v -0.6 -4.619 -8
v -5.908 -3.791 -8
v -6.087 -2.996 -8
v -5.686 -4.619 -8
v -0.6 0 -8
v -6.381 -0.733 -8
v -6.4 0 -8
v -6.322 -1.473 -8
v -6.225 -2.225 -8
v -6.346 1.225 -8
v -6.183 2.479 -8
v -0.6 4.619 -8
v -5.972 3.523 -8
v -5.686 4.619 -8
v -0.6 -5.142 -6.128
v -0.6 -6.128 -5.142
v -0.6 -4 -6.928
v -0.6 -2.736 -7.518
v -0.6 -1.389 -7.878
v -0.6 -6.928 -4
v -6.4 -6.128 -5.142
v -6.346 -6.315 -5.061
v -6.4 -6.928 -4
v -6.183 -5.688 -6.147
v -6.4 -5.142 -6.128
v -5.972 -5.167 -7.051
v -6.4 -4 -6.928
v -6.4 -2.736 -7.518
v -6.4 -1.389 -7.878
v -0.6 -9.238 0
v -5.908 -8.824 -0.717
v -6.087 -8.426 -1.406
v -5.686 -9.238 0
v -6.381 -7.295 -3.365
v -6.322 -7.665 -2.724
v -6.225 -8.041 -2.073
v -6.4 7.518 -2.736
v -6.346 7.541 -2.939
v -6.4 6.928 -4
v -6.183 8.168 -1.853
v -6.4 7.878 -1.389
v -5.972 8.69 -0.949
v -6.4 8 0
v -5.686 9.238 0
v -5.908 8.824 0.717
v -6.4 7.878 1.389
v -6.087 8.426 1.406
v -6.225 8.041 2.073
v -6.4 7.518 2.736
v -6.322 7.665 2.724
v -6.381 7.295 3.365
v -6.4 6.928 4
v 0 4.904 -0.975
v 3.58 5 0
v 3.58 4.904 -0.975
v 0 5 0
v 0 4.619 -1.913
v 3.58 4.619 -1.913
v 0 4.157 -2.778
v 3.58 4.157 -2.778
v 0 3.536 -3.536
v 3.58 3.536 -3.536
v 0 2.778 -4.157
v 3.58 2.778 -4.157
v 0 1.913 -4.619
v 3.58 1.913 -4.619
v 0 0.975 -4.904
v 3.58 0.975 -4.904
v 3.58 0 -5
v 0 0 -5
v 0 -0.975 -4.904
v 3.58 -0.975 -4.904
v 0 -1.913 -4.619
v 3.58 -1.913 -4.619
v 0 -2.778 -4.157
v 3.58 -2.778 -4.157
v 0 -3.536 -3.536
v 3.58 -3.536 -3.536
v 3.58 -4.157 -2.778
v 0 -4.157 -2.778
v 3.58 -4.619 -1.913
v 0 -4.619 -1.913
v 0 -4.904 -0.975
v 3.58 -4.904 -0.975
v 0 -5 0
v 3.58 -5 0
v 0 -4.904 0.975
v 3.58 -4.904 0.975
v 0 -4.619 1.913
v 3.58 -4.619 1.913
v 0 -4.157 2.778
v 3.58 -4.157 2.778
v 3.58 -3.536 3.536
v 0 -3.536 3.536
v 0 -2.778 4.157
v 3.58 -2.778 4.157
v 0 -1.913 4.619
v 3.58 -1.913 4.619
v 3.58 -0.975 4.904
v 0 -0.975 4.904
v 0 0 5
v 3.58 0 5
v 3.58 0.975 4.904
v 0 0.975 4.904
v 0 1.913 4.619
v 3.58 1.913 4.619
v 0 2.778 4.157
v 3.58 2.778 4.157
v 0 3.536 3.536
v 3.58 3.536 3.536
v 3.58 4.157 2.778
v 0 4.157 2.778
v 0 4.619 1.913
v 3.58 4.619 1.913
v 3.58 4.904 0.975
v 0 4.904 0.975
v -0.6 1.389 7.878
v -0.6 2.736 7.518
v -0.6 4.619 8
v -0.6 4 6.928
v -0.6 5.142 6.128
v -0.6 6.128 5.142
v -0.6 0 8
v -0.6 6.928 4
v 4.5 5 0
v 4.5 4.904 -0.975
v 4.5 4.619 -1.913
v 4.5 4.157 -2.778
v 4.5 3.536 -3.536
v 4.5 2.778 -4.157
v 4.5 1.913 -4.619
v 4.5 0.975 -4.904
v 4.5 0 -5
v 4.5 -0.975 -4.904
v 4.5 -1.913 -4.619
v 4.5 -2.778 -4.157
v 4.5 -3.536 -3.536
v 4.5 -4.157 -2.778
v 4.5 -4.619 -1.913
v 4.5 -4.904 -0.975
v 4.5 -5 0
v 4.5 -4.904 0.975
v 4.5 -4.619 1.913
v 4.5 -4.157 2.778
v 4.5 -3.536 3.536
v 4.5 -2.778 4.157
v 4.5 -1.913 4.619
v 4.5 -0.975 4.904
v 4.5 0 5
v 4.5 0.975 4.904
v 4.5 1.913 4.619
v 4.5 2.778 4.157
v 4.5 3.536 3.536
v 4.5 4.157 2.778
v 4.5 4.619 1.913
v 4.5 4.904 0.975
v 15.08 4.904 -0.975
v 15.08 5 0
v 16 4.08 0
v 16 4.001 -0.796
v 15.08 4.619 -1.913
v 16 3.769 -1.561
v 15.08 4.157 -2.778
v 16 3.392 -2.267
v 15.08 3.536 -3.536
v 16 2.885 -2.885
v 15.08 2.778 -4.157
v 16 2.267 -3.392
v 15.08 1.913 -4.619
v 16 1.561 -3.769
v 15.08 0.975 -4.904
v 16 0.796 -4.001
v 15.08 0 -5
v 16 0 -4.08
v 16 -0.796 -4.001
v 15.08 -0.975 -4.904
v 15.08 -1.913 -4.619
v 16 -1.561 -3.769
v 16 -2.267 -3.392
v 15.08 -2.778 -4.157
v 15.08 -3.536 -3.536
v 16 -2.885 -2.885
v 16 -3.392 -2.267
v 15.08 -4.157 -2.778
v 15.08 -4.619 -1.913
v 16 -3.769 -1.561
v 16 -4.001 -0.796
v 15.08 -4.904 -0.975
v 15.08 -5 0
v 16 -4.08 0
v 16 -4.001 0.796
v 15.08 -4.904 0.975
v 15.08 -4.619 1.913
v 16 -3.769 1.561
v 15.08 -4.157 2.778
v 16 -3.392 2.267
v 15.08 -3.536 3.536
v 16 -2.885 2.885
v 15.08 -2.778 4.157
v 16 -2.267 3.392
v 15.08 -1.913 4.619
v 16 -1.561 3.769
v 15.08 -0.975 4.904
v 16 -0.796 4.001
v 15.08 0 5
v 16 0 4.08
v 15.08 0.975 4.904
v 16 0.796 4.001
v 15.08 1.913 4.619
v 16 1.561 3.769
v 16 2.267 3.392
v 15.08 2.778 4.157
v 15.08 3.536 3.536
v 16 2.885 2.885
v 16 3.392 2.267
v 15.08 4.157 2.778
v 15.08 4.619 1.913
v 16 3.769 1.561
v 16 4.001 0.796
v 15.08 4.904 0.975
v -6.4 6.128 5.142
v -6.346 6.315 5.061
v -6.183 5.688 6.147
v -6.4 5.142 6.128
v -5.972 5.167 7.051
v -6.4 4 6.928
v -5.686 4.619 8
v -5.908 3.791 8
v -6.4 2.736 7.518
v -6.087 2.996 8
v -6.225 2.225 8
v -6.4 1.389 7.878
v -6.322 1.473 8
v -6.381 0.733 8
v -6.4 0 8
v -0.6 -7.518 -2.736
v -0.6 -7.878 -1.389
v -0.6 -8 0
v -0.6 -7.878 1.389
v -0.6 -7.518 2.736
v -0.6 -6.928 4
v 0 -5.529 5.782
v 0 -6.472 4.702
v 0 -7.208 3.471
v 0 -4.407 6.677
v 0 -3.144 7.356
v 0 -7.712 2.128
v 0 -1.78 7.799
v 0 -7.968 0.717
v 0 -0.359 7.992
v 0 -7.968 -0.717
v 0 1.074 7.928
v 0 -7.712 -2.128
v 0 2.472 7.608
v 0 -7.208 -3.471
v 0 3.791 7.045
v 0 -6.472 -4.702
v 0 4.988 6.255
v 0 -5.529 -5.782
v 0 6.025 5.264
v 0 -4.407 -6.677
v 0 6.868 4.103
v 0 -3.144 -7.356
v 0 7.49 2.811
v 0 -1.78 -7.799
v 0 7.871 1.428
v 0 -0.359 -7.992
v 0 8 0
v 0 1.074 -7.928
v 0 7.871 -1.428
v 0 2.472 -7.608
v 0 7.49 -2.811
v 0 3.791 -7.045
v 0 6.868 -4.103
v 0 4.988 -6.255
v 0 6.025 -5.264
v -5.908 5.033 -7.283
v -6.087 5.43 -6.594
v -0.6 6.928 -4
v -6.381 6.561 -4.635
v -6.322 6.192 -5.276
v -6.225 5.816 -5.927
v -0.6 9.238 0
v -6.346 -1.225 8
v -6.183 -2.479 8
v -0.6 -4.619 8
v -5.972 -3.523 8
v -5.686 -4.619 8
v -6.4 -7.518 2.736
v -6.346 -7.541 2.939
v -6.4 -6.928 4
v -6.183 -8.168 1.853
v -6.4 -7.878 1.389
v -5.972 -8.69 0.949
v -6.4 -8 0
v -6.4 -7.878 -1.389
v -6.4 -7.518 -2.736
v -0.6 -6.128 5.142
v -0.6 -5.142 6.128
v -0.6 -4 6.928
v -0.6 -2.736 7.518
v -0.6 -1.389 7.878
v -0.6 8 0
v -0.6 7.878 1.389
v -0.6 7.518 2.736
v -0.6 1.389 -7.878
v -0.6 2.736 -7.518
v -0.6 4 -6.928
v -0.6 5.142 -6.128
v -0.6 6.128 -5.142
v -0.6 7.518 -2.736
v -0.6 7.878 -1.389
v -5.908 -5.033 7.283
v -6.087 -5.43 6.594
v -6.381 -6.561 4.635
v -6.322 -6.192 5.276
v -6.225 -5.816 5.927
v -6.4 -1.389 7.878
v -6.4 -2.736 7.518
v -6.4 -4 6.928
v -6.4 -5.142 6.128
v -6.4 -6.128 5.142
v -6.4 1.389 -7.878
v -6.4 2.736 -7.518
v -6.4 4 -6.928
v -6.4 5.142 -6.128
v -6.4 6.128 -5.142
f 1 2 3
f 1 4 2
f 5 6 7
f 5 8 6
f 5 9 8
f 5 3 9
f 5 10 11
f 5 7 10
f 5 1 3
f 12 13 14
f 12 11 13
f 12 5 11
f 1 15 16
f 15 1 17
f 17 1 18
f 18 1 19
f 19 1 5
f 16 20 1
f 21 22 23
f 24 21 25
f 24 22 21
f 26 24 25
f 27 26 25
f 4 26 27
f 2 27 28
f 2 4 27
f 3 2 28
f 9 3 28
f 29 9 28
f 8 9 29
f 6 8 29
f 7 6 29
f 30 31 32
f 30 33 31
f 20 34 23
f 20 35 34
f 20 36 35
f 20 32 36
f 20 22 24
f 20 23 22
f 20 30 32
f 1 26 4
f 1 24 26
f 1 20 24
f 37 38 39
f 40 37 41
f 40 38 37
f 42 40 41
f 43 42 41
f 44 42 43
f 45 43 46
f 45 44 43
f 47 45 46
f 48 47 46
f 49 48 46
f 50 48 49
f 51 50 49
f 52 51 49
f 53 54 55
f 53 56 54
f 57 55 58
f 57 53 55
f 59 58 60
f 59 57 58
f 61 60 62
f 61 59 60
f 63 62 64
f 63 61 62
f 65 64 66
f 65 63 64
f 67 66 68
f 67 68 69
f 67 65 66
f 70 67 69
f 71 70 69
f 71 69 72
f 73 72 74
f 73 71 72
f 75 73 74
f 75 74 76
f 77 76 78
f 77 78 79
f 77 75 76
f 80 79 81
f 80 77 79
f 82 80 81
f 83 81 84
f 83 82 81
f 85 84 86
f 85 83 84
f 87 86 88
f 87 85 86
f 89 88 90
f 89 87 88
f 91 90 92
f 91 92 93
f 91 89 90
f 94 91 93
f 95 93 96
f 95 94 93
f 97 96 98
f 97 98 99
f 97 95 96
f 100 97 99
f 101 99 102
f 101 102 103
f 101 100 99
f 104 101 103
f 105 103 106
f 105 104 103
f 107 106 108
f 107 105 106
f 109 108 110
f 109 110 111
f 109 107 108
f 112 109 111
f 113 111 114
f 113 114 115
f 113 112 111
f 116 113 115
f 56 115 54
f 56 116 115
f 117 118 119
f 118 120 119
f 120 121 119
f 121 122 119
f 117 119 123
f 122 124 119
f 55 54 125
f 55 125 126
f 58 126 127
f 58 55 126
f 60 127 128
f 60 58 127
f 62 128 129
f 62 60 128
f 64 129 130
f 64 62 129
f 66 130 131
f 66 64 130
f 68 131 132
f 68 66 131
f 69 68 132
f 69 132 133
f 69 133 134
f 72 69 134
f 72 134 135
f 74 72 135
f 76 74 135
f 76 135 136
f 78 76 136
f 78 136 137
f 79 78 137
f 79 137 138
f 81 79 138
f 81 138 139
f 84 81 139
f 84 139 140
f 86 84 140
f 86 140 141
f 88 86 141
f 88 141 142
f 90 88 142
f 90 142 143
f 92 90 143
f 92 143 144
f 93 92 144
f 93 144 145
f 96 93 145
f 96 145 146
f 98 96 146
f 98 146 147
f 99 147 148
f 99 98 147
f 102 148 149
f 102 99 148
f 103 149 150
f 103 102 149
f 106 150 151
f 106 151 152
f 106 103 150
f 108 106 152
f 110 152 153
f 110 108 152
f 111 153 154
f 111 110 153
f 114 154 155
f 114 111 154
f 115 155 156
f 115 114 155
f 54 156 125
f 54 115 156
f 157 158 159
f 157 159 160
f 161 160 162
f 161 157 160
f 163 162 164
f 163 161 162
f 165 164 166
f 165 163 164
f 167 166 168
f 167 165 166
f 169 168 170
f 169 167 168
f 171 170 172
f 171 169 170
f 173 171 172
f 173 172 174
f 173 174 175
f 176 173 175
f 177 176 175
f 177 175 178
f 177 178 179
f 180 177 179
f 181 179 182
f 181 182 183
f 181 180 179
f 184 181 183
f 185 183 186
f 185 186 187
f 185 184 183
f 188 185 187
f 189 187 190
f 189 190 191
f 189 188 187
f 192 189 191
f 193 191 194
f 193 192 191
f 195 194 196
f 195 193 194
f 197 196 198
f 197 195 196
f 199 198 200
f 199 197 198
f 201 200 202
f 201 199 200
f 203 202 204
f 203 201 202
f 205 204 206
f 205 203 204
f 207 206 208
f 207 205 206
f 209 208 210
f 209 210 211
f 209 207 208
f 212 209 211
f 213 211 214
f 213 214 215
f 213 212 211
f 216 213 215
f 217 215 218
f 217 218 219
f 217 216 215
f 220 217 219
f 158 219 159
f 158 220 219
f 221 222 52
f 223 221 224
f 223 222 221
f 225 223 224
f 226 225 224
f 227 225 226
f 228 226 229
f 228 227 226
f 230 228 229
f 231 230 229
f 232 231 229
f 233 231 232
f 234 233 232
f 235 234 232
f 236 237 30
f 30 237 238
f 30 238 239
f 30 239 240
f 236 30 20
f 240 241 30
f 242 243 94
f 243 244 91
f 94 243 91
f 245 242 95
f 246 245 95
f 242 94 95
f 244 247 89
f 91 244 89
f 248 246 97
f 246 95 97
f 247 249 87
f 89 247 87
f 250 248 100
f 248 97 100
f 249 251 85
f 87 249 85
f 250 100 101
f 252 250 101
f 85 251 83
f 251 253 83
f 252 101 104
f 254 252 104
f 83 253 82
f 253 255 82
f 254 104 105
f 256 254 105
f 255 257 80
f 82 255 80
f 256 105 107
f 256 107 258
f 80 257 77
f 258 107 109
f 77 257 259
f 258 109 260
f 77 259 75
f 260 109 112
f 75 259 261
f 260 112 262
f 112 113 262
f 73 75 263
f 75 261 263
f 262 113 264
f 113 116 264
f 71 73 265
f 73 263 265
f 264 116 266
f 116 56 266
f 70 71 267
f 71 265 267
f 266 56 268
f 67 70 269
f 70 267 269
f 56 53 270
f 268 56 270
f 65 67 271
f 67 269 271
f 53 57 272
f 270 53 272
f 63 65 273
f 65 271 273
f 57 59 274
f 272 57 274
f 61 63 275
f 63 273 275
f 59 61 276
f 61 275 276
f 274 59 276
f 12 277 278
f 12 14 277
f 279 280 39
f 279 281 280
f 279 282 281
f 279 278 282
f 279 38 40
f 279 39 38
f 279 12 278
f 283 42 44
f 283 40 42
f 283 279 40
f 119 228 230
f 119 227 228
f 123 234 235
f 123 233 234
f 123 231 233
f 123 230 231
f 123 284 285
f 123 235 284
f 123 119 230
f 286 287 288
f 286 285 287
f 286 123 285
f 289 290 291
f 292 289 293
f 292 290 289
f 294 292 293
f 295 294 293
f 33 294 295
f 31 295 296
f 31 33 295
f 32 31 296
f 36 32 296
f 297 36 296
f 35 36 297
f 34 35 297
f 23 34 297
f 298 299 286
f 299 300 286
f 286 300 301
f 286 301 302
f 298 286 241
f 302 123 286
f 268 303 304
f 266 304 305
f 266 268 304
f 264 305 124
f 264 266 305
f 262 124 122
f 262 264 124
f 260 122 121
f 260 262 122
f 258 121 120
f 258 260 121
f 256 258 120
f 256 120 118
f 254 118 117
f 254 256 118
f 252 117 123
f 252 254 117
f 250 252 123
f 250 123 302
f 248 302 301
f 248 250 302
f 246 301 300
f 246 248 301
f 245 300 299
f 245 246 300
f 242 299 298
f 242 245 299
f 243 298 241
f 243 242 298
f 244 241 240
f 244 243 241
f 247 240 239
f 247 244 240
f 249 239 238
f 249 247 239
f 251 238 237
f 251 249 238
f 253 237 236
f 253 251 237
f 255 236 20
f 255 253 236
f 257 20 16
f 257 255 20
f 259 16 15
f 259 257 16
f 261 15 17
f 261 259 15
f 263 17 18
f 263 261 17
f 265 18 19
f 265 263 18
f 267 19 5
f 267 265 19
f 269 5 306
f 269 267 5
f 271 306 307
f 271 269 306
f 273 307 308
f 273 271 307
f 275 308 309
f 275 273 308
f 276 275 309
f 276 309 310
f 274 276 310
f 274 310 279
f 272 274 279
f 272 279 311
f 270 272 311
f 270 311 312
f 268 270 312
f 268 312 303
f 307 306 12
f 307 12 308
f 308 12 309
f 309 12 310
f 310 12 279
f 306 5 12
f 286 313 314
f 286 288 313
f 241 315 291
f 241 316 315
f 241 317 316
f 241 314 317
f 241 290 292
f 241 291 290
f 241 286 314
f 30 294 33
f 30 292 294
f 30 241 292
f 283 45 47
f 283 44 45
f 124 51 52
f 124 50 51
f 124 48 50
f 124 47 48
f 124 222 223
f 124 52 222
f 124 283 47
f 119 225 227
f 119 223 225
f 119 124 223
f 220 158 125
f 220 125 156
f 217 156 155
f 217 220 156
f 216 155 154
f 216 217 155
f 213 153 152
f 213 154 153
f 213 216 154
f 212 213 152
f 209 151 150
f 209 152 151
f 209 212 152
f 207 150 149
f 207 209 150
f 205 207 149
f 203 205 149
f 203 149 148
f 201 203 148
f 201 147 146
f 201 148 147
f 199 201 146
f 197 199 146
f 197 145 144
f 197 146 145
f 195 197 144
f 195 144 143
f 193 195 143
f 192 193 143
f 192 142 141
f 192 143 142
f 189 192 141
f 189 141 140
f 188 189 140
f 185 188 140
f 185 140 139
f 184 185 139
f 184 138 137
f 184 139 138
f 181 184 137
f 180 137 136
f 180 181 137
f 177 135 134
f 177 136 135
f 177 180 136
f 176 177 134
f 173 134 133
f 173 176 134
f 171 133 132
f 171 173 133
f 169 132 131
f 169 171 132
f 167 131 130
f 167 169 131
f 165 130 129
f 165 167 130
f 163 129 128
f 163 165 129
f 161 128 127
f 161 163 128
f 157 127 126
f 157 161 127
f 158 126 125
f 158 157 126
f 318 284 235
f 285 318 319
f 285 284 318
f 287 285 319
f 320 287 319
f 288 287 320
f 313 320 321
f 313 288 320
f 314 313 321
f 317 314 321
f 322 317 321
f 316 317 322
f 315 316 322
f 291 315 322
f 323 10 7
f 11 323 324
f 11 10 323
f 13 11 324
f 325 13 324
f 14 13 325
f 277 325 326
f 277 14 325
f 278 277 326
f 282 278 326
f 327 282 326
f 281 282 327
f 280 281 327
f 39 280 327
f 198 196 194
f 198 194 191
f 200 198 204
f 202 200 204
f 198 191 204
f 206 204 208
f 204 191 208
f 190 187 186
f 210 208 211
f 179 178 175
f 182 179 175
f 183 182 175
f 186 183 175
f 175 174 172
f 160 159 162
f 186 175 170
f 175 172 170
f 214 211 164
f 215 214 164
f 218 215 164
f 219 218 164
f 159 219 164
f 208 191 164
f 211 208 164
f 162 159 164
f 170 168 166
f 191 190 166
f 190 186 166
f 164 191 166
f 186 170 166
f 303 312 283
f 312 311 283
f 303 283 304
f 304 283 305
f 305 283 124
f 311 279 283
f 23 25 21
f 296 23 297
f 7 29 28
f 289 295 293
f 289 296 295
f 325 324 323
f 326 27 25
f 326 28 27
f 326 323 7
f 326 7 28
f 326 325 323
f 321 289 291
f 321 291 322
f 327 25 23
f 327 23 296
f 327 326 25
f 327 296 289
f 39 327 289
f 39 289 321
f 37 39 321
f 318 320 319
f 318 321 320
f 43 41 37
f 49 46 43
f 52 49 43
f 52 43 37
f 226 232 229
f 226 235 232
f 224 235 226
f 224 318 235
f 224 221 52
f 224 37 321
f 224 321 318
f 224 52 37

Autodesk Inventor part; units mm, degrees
ref_plane "YZ Plane" through (0, 0, 0) normal (1, 0, 0) x (0, 1, 0)
ref_plane "XZ Plane" through (0, 0, 0) normal (0, 1, 0) x (-1, 0, 0)
sketch "Sketch1" plane through (0, 0, 0) normal (0, 0, 1) x (1, 0, 0)
  line L0 (0, 8) -> (0, 5)
  line L1 (4.5, 5) -> (16, 5)
  line L2 (16, 5) -> (16, 0)
  line L3 (16, 0) -> (-0.6001, 0)
  line L4 (-3.9201, 0) -> (19.32, 0) projected
  line L5 (-0.6001, 0) -> (-0.6001, 8)
  line L6 (-0.6001, 8) -> (0, 8)
  line L7 (4.5, 5) -> (3.5797, 5)
  line L8 (3.5797, 5) -> (0, 5)
  line L9 (0, -1.6) -> (0, 9.6) projected
  dimension "d0" = 16
  dimension "d1" = 11.5
  dimension "d2" = 10
  dimension "d9" = 0.6001
  dimension "d10" = 16
  dimension "d13" = 0.9203
  dimension "d14" = 10
revolve "Body" add sketch "Sketch1" angle 360 about axis through (16, 0, 0) along (-1, 0, 0)
sketch "Sketch2" plane through (-0.6001, 0, 0) normal (-1, 0, 0) x (0, 0, 1)
  line L0 (0, 9.2376) -> (8, 4.6188)
  line L1 (8, 4.6188) -> (8, -4.6188)
  line L2 (8, -4.6188) -> (0, -9.2376)
  line L3 (0, -9.2376) -> (-8, -4.6188)
  line L4 (-8, -4.6188) -> (-8, 4.6188)
  line L5 (-8, 4.6188) -> (0, 9.2376)
  point P0 (0, 0)
  point P1 (0, 0)
  dimension "d11" = 16
extrude "Head" add sketch "Sketch2" along normal blind 5.8
sketch "Sketch4" plane through (0, 0, 0) normal (0, 0, 1) x (1, 0, 0)
  line L0 (-6.4001, 8) -> (-6.4001, 9.2376)
  line L1 (-6.4001, 9.2376) -> (-5.6856, 9.2376)
  line L2 (-5.6856, 9.2376) -> (-6.4001, 8)
  line L3 (-7.5601, 0) -> (0.5599, 0) projected
  line L4 (-0.6001, 9.2376) -> (-6.4001, 9.2376) projected
  line L5 (-6.4001, 4.6188) -> (-6.4001, 9.2376) projected
  dimension "d5" = 30
  dimension "d19" = 16
revolve "Chamfer1" cut sketch "Sketch4" angle 360 about axis through (-10, 0, 0) along (1, 0, 0)
thread "Thread" size "M10x1.5" class "6g" standard "ISO Metric profile" length 11.5
chamfer "Chamfer2" distance 0.9202 distance2 0.9203 1 edges at (16, -5, 0) measured on face at (16, -0.8193, 0.3214)
ref_plane "Work Plane1" through (1.525, 0, 0) normal (0, 0, 1) x (1, 0, 0)
equation "\"d11\" = SW"
equation "\"d3\" = KOH - SD"
equation "\"d15\" = GEL"
equation "\"d6\" = -0.5 * SPD + 0.5 * GD"
equation "\"d0\" = NLG"
equation "\"d1\" = GEL"
equation "\"d2\" = GD"
equation "\"d10\" = SD2"
equation "\"d14\" = BDM"
equation "\"d5\" = ANG1"
equation "\"d19\" = SW0"
equation "\"NLG\" = 16"
equation "\"GD\" = NND"
equation "\"BDM\" = NND"
equation "\"KOH\" = 6.4"
equation "\"GEL\" = 11.5"
equation "\"SW\" = 16"
equation "\"SW0\" = SW"
equation "\"SPD\" = NND - 1.2269 * PTC"
equation "\"SD2\" = SW"
equation "\"SD\" = 0.6"
equation "\"ANG1\" = 30deg"
equation "\"GAL\" = 0.61345 * PTC"
equation "\"GUL\" = 0.61345 * PTC"
equation "\"RR\" = 0.4"
equation "\"WFT\" = SD"
equation "\"GD1\" = THREADDIA - 1.2269 * PTC"
equation "\"SDH\" = SW"
equation "\"TOA\" = 30deg"
equation "\"FAWI\" = 45deg"
equation "\"PTC\" = 1.5"
equation "\"E0\" = 1.155 * SW"
equation "\"NND\" = 10"
equation "\"THREADDIA\" = 10"
properties part number "AS 1110 - M10 x 16" material "Steel, Mild"
